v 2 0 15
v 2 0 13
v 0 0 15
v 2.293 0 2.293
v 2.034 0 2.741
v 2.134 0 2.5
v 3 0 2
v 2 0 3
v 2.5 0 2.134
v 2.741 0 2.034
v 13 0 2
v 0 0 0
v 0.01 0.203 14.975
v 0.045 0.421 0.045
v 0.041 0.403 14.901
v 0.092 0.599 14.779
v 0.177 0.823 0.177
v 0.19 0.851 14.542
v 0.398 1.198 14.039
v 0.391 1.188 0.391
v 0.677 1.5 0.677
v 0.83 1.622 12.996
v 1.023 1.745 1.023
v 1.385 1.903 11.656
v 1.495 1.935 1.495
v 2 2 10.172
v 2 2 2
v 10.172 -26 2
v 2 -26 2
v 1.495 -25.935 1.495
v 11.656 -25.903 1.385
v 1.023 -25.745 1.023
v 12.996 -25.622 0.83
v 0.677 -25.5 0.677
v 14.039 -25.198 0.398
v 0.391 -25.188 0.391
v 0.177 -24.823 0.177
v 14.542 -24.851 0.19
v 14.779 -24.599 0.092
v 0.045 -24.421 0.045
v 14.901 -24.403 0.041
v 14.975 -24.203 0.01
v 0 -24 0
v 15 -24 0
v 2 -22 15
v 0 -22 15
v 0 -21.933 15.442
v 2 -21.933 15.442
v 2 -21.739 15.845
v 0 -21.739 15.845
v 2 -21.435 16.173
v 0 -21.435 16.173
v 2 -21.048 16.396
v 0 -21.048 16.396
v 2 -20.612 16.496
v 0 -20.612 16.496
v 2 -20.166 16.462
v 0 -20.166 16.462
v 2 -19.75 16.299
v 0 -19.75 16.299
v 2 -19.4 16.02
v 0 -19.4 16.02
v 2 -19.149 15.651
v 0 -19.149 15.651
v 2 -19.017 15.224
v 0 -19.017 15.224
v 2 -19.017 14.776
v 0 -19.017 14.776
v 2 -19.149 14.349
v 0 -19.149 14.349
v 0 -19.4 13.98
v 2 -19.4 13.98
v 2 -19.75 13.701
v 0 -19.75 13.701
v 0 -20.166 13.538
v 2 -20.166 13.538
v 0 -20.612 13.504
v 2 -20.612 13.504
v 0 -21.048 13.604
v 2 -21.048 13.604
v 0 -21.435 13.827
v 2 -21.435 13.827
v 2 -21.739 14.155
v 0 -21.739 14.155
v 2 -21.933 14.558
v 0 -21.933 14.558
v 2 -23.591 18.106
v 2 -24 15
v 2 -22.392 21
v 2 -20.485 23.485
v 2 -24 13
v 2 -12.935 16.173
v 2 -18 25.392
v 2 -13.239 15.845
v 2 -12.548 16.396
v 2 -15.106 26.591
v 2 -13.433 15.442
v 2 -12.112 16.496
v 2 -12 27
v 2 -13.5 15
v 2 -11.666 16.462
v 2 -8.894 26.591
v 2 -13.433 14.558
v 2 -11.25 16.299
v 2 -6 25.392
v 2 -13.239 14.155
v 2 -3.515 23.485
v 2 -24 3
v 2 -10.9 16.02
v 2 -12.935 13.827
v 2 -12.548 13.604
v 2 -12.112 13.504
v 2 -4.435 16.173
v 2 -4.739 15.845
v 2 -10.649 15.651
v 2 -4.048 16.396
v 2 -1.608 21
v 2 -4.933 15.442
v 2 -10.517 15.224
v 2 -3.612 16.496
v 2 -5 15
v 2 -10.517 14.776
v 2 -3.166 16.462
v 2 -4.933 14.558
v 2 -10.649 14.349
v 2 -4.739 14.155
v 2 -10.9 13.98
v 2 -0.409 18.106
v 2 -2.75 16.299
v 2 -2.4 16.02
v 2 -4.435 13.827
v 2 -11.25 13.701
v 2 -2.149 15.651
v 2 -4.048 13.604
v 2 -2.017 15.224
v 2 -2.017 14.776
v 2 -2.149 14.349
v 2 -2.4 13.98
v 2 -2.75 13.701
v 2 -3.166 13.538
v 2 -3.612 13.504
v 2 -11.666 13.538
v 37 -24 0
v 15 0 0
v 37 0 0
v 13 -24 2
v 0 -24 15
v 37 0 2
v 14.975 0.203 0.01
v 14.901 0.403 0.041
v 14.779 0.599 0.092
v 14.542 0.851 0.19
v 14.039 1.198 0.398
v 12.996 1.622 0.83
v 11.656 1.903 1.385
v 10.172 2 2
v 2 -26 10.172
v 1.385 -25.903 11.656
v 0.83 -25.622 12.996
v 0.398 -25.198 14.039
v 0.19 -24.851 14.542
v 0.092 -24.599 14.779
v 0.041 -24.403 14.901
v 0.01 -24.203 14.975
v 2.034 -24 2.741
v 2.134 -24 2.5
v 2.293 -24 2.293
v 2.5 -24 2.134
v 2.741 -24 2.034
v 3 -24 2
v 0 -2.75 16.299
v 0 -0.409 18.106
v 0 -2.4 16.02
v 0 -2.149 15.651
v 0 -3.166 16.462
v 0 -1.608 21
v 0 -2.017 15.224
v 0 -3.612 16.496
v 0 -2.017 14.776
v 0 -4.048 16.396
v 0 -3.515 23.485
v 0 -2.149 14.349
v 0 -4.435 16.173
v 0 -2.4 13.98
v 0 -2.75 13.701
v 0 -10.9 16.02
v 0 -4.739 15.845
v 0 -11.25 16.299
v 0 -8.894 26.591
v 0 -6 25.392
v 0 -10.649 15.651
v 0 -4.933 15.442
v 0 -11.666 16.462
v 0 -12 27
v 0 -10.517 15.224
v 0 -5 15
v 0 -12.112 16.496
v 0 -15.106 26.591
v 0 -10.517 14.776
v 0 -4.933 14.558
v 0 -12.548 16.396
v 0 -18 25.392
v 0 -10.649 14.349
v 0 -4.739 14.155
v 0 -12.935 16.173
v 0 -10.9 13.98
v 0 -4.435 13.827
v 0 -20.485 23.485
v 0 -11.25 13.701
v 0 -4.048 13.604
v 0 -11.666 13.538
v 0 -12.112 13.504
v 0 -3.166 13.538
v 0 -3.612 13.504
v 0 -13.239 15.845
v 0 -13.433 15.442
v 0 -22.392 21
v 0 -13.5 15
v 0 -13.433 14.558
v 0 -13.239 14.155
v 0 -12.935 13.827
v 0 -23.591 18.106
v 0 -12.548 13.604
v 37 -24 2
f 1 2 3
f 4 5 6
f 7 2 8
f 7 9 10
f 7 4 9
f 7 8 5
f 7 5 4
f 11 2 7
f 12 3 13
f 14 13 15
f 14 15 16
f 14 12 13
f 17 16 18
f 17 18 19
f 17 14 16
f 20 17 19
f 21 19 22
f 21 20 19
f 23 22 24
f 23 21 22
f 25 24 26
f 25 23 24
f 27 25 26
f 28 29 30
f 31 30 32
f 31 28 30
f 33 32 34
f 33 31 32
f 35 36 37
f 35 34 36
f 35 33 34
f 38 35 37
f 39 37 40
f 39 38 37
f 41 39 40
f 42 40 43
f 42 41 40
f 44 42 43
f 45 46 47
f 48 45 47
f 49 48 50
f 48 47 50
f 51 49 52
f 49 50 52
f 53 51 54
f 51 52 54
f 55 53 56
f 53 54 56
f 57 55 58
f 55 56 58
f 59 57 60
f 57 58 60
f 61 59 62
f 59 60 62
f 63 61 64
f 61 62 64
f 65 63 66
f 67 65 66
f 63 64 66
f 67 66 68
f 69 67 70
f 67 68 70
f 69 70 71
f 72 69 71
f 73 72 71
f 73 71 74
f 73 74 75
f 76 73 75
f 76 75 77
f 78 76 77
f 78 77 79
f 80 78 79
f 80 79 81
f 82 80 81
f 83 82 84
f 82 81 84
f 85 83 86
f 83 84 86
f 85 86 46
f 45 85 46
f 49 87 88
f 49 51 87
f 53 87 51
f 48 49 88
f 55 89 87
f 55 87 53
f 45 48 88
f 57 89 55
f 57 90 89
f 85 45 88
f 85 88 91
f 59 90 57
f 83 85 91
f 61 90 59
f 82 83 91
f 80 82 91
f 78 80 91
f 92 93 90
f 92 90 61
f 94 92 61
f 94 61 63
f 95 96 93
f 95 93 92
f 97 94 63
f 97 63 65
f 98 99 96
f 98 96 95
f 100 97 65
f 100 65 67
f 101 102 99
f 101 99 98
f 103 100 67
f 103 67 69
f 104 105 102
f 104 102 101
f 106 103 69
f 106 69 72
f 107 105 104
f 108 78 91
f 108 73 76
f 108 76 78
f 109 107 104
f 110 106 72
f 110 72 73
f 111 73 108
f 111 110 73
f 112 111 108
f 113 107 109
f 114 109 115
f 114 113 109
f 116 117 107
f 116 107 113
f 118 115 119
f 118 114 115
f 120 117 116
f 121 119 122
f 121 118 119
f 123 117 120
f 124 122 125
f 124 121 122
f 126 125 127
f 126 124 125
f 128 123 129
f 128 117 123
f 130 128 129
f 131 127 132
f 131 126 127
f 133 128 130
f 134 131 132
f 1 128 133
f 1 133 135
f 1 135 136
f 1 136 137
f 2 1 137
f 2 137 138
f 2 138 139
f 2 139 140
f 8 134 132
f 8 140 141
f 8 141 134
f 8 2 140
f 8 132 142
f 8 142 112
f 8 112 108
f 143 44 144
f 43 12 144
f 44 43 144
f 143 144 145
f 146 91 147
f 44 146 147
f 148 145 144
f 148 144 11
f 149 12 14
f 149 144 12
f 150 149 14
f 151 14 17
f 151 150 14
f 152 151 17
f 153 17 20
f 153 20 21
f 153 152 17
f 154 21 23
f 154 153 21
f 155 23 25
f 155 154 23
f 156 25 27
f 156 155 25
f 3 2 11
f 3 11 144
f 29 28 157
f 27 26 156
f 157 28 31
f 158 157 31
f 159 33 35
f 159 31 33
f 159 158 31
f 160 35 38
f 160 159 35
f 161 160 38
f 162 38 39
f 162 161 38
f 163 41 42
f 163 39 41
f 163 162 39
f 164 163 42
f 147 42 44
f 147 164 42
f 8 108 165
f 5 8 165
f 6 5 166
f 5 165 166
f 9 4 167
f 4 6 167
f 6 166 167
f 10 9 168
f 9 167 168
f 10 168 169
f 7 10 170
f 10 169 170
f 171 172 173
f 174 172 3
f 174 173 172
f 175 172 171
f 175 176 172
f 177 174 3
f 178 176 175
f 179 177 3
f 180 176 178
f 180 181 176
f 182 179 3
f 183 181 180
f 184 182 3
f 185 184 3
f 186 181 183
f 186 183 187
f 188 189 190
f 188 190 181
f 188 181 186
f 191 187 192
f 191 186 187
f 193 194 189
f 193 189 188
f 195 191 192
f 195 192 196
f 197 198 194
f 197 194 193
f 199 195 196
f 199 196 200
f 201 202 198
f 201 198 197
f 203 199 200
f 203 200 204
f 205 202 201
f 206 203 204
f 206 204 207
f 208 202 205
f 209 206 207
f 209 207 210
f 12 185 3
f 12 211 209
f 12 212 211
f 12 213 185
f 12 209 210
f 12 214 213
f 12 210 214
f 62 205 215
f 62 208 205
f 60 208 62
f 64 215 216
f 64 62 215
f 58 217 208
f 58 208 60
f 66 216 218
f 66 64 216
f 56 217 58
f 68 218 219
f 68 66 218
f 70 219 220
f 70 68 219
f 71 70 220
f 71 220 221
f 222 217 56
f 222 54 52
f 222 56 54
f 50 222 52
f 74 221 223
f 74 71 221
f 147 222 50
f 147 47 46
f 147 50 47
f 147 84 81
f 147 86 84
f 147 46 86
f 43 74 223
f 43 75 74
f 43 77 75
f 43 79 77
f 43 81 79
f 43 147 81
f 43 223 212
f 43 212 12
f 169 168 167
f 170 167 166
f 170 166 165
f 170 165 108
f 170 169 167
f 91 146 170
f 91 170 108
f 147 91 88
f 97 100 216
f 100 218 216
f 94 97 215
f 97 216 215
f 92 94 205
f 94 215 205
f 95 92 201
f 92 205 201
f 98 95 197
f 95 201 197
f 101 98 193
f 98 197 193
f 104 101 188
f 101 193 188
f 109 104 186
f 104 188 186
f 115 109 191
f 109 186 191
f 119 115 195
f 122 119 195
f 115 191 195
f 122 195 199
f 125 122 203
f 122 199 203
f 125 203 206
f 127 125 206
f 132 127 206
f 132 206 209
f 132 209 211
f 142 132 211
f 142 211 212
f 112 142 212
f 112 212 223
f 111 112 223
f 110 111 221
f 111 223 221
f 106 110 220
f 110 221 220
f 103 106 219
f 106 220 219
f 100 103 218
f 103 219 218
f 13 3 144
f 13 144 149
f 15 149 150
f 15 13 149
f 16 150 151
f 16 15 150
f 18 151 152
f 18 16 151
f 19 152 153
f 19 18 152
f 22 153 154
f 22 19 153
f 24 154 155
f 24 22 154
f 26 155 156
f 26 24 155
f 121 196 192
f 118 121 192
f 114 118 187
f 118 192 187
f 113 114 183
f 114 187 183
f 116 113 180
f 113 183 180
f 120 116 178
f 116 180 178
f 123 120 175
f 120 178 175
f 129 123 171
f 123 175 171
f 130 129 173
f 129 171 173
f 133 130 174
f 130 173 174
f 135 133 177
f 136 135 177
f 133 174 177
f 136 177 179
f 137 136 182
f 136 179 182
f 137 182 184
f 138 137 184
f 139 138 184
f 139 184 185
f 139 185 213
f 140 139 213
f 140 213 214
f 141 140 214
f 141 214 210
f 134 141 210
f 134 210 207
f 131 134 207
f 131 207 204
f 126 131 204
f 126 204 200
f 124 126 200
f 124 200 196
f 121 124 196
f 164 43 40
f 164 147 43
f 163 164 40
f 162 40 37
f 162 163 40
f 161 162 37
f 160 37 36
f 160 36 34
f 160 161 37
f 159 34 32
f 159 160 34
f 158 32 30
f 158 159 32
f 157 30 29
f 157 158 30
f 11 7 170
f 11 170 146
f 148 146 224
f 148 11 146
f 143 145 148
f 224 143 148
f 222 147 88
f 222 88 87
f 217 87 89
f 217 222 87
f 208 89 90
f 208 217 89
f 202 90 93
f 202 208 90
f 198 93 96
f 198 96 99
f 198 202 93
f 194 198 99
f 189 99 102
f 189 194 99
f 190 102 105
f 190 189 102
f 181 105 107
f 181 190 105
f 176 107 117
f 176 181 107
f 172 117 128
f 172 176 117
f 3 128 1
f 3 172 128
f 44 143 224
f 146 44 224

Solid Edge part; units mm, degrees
sketch "Sketch1" plane through (0, 0, 0) normal (0, -1, 0) x (1, 0, 0)
  line L0 (0, 0) -> (0, 27)
  line L1 (2, 27) -> (0, 27)
  line L2 (2, 27) -> (2, 2)
  line L3 (2, 2) -> (37, 2)
  line L4 (37, 0) -> (37, 2)
  line L5 (0, 0) -> (37, 0)
extrude "Protrusion1" add sketch "Sketch1" along normal blind 24
sketch "Sketch2" plane through (0, -12, 13.5) normal (-1, 0, 0) x (0, -1, 0)
  line L0 (12, 1.5) -> (14.2005, 1.5)
  line L1 (14.2005, 1.5) -> (14.2005, 15.1309)
  line L2 (14.2005, 15.1309) -> (-13.515, 15.1309)
  line L3 (-13.515, 15.1309) -> (-13.515, 1.5)
  line L4 (-13.515, 1.5) -> (-12, 1.5)
  arc A0 (-12, 1.5) -> (12, 1.5) centre (0, 1.5) cw
extrude "ExtrudedCutout_1" cut sketch "Sketch2" against normal blind 10
sketch "Sketch3" plane through (0, -12, 13.5) normal (-1, 0, 0) x (0, -1, 0)
  circle A0 centre (0, 1.5) radius 1.5
  circle A1 centre (8.5, 1.5) radius 1.5
  circle A2 centre (-8.5, 1.5) radius 1.5
extrude "ExtrudedCutout_2" cut sketch "Sketch3" against normal blind 10
fillet "Round_1" radius 1 1 edges at (2, -12, 2)
sketch "Sketch4" plane through (18.5, 0, 7.5) normal (0, 1, 0) x (-1, 0, 0)
  line L0 (18.5, 7.5) -> (18.5, -7.5)
  line L1 (18.5, -7.5) -> (3.5, -7.5)
  line L2 (3.5, -7.5) -> (18.5, 7.5)
extrude "ExtrudedProtrusion_2" add sketch "Sketch4" along normal blind 2
sketch "Sketch5" plane through (18.5, -24, 7.5) normal (0, -1, 0) x (1, 0, 0)
  line L0 (-18.5, -7.5) -> (-18.5, 7.5)
  line L1 (-3.5, -7.5) -> (-18.5, 7.5)
  line L2 (-18.5, -7.5) -> (-3.5, -7.5)
extrude "ExtrudedProtrusion_3" add sketch "Sketch5" along normal blind 2
fillet "Round_2" radius 2 6 edges at (7.5, -26, 0) (7.5, 2, 0) (0, -26, 7.5) (0, 2, 7.5) (7.5, 2, 7.5) (7.5, -26, 7.5)
